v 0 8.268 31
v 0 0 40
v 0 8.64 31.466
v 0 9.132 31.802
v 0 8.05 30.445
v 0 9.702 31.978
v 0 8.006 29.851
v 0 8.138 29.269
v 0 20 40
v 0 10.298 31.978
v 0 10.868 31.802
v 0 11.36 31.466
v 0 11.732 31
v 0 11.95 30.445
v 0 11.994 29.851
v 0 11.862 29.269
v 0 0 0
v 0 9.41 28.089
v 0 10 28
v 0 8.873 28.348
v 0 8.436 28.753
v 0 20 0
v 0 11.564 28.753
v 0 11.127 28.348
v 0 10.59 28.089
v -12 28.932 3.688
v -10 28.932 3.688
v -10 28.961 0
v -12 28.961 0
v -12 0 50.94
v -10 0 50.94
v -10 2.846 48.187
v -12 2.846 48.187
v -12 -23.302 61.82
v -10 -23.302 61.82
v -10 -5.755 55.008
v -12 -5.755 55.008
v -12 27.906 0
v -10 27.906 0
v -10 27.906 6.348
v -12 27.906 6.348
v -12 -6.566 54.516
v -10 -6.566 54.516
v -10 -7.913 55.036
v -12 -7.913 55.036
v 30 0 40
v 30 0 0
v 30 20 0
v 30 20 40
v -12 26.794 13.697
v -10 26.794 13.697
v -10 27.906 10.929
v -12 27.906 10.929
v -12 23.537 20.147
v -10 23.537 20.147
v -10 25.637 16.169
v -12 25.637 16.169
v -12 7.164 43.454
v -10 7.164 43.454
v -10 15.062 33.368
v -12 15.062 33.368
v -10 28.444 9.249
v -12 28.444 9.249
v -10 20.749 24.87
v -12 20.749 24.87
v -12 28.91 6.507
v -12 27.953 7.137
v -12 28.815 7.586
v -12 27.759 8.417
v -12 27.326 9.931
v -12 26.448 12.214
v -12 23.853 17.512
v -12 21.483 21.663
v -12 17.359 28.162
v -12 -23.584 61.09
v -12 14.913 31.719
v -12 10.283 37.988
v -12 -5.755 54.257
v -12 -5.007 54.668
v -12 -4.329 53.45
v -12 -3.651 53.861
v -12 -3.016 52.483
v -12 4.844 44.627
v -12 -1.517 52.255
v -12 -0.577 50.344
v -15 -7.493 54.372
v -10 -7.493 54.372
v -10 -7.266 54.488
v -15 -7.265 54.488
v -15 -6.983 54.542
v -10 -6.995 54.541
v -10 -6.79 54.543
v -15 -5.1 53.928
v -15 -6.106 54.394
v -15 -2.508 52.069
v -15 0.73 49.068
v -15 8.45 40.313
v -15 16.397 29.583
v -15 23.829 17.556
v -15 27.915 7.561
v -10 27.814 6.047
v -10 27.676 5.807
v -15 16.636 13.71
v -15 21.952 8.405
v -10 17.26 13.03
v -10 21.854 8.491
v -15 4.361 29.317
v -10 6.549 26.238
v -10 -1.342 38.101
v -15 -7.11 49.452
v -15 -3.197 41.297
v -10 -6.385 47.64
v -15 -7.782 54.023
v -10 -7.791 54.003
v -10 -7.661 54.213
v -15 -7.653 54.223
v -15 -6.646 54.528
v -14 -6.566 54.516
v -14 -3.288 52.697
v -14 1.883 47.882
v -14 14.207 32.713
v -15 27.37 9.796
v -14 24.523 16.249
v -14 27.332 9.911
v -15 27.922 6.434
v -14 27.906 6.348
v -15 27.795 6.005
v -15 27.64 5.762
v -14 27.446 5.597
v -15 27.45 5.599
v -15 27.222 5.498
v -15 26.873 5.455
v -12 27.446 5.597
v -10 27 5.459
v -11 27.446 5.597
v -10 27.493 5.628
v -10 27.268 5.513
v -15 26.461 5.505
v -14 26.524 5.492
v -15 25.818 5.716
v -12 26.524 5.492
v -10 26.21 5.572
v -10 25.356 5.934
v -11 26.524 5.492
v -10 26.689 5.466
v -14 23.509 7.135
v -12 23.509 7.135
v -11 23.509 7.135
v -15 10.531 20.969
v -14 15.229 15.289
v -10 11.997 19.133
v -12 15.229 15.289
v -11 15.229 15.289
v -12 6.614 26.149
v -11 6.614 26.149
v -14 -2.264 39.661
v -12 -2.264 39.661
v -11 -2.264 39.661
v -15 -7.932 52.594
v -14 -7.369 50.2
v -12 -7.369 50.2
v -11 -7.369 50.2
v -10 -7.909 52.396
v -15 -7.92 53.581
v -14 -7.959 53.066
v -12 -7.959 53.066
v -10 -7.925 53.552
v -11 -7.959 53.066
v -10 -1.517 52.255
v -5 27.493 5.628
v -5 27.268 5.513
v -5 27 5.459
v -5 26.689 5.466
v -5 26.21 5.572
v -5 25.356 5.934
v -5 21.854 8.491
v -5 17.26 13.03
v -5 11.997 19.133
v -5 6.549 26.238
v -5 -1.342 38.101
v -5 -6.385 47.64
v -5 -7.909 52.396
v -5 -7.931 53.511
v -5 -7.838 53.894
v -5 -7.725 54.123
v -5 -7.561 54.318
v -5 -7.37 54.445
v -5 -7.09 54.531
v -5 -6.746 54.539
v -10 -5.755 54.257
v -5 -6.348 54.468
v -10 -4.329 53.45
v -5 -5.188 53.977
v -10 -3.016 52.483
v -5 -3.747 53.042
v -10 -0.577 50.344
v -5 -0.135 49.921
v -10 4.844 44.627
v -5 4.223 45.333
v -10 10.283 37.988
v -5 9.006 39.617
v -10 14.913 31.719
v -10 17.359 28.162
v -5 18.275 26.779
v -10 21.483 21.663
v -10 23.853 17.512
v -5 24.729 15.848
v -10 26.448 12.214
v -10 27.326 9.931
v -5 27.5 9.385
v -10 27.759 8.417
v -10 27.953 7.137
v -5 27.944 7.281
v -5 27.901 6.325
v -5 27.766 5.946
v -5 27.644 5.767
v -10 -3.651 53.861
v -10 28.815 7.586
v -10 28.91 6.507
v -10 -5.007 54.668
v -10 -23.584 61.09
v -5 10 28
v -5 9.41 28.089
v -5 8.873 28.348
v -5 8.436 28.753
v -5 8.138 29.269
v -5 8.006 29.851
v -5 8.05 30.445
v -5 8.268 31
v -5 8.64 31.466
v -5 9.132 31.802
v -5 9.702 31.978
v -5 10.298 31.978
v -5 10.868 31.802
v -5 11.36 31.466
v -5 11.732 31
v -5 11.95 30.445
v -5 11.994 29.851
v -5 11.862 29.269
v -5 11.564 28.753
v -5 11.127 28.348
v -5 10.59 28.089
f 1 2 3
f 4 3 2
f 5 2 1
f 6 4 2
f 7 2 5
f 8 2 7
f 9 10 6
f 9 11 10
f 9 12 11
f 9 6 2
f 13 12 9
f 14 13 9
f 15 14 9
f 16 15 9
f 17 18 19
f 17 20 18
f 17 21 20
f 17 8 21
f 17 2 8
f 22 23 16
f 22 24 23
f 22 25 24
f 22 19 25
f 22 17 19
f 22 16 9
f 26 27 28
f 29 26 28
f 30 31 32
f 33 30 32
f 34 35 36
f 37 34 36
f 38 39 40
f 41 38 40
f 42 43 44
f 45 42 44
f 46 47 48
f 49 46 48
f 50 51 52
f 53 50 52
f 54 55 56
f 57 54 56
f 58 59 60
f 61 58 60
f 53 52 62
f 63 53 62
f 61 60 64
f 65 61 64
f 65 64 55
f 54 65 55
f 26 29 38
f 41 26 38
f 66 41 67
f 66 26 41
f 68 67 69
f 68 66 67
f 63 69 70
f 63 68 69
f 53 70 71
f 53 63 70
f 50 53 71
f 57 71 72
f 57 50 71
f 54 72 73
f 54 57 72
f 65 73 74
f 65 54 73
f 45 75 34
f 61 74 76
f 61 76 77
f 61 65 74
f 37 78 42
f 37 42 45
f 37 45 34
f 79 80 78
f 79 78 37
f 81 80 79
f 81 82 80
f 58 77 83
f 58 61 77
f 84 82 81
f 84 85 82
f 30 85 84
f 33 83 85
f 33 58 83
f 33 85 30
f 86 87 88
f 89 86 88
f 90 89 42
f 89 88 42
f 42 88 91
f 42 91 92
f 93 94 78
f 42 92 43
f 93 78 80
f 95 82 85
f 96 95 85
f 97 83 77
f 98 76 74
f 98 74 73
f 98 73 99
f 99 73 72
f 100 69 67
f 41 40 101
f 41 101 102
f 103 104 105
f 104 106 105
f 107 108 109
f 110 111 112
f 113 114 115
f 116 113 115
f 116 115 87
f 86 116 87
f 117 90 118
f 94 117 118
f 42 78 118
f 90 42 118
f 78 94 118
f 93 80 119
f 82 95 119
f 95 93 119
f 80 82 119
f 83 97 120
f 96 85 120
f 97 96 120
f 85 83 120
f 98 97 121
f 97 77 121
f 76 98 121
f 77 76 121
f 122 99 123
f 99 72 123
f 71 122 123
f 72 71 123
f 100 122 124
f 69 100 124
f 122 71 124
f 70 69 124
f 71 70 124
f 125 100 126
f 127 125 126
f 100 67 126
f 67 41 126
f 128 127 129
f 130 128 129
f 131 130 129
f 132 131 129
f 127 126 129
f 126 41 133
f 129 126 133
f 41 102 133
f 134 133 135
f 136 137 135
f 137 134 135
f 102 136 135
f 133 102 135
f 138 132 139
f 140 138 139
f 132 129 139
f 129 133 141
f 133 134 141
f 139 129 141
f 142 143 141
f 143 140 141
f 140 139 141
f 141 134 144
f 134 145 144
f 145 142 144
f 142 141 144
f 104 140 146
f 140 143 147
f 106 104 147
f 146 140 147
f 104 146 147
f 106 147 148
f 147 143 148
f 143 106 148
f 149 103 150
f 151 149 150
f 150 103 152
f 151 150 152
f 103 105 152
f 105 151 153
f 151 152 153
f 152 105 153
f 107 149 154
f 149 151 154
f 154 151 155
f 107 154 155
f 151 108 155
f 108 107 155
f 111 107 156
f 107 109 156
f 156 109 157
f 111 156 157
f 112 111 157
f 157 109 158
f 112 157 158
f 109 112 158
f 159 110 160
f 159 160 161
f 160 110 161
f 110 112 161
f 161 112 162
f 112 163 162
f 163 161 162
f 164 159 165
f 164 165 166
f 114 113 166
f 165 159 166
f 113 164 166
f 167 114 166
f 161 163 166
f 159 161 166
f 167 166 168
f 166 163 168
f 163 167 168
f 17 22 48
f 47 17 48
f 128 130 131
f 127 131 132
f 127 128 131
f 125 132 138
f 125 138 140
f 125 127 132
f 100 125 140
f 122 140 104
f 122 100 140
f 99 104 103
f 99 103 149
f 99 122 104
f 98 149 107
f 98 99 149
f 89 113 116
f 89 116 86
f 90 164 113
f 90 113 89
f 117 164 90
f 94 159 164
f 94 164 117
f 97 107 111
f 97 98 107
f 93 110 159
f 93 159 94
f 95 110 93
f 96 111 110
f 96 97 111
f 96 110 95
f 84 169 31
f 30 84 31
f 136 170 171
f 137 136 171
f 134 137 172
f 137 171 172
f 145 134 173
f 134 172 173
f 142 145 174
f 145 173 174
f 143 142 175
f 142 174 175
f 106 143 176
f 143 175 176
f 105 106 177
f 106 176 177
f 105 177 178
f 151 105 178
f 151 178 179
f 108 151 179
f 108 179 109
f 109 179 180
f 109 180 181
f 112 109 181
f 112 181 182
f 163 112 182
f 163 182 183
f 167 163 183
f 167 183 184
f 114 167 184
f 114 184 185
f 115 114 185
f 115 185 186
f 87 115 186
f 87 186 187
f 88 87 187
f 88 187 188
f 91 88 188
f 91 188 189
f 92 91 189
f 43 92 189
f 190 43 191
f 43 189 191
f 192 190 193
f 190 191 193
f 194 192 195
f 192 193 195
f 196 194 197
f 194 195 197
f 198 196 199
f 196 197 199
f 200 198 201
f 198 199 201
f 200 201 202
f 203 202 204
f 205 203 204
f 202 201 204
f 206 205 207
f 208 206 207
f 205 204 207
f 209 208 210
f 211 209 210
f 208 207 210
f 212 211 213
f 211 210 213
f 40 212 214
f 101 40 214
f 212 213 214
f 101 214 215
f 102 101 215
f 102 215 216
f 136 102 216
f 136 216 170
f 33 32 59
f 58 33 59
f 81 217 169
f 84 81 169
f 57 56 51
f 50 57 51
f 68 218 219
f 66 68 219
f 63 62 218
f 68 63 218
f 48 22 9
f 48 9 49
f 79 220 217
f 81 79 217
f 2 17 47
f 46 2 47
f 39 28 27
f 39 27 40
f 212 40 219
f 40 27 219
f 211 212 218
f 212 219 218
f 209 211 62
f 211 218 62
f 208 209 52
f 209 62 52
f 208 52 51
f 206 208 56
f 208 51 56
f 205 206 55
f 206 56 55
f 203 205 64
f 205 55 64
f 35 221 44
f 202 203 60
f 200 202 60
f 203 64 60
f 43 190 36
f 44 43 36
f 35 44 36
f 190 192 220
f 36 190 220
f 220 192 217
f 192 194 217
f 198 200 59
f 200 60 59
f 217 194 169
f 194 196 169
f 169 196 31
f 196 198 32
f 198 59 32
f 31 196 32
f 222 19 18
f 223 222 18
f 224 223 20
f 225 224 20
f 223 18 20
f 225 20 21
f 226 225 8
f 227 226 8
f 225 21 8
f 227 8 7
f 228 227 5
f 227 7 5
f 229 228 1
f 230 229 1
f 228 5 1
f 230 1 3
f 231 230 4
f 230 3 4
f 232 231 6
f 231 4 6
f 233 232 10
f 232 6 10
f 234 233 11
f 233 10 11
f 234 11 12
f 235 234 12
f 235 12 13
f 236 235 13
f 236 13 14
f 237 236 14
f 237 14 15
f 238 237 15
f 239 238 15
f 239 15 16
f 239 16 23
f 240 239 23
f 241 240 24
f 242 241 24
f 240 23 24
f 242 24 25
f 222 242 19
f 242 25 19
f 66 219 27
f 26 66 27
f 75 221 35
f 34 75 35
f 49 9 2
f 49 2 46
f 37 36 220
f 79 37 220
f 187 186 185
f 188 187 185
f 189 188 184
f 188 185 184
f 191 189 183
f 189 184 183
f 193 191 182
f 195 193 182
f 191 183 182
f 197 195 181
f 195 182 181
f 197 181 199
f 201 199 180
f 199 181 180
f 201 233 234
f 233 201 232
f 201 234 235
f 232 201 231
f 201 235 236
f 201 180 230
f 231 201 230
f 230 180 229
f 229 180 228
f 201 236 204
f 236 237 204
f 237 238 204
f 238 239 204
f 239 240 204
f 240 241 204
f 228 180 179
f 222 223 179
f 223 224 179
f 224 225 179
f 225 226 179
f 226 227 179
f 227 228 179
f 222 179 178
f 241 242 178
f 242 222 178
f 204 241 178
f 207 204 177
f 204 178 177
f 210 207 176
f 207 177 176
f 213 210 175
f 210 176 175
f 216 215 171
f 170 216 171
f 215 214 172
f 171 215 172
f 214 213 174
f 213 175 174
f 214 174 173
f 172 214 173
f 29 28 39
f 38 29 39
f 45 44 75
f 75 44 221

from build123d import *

# Parameters (mm, degrees)
SKETCH_1_W      = 30
SKETCH_1_H      = 20
EXTRUDE_1_DEPTH = 40
SKETCH_2_R      = 2
EXTRUDE_2_DEPTH = 5
SKETCH_3_RX     = 30
SKETCH_3_RY     = 5
EXTRUDE_3_DEPTH = 5
EXTRUDE_4_DEPTH = 2
EXTRUDE_5_DEPTH = 5


# Read off the part's stored shape, not the designer's step: 凸台-拉伸5
with BuildPart() as part:
    # 草图1 → 凸台-拉伸1 (new body)
    with BuildSketch(Plane.XY):
        with Locations((15, 10)):
            Rectangle(SKETCH_1_W, SKETCH_1_H)
    extrude(amount=EXTRUDE_1_DEPTH)

    # 草图2 → 凸台-拉伸2 (add)
    with BuildSketch(Plane.ZY):
        with Locations(Location((30, 10, 0), (0, 0, 180))):
            Circle(SKETCH_2_R)
    extrude(amount=EXTRUDE_2_DEPTH)

    # 草图3 → 凸台-拉伸3 (add)
    with BuildSketch(Plane.ZY.offset(5)):
        with Locations(Location((30, 10), (0, 0, 144.330167024))):
            Ellipse(SKETCH_3_RX, SKETCH_3_RY)
    extrude(amount=EXTRUDE_3_DEPTH)



with BuildPart() as body_2:
    # 草图4 → 凸台-拉伸4 (new body)
    with BuildSketch(Plane.ZY.offset(10)):
        with BuildLine():
            add(Edge.make_bspline(
                [(6.506952715, 28.909855834), (5.513332822, 28.917697958), (4.992779523, 28.561751889)],
                knots=[6.015569415, 6.015569415, 6.015569415, 6.212983263, 6.212983263, 6.212983263], degree=2, weights=[1, 0.995132426, 1]))
            Line((4.992779523, 28.561751889), (7.137480457, 27.953085866))
            add(Edge.make_bspline(
                [(8.41739908, 27.759268462), (7.691843708, 27.924954947), (7.137480457, 27.953085866)],
                knots=[5.905821209, 5.905821209, 5.905821209, 6.029787374, 6.029787374, 6.029787374], degree=2, weights=[1, 0.998079664, 1]))
            add(Edge.make_bspline(
                [(9.931154304, 27.32571063), (9.102712315, 27.602771598), (8.41739908, 27.759268462)],
                knots=[5.788714528, 5.788714528, 5.788714528, 5.905821209, 5.905821209, 5.905821209], degree=2, weights=[1, 0.998286243, 1]))
            add(Edge.make_bspline(
                [(12.213928034, 26.448131332), (10.970222869, 26.978208516), (9.931154304, 27.32571063)],
                knots=[5.641930178, 5.641930178, 5.641930178, 5.788714528, 5.788714528, 5.788714528], degree=2, weights=[1, 0.997308003, 1]))
            add(Edge.make_bspline(
                [(17.511716763, 23.85284507), (14.569327703, 25.444240976), (12.213928034, 26.448131332)],
                knots=[5.365220638, 5.365220638, 5.365220638, 5.641930178, 5.641930178, 5.641930178], degree=2, weights=[1, 0.990444236, 1]))
            add(Edge.make_bspline(
                [(21.663153618, 21.483483589), (19.49565109, 22.779830964), (17.511716763, 23.85284507)],
                knots=[5.17799572, 5.17799572, 5.17799572, 5.365220638, 5.365220638, 5.365220638], degree=2, weights=[1, 0.995621553, 1]))
            add(Edge.make_bspline(
                [(28.161833123, 17.358582765), (24.817516303, 19.596911494), (21.663153618, 21.483483589)],
                knots=[4.906410628, 4.906410628, 4.906410628, 5.17799572, 5.17799572, 5.17799572], degree=2, weights=[1, 0.990794351, 1]))
            add(Edge.make_bspline(
                [(31.719121271, 14.913354973), (29.940162996, 16.168358555), (28.161833123, 17.358582765)],
                knots=[4.761356742, 4.761356742, 4.761356742, 4.906410628, 4.906410628, 4.906410628], degree=2, weights=[1, 0.997371074, 1]))
            add(Edge.make_bspline(
                [(37.988291289, 10.282541681), (34.937566868, 12.642834742), (31.719121271, 14.913354973)],
                knots=[4.4999664, 4.4999664, 4.4999664, 4.761356742, 4.761356742, 4.761356742], degree=2, weights=[1, 0.991471536, 1]))
            add(Edge.make_bspline(
                [(44.627089911, 4.844191407), (41.578227004, 7.505070109), (37.988291289, 10.282541681)],
                knots=[4.193044565, 4.193044565, 4.193044565, 4.4999664, 4.4999664, 4.4999664], degree=2, weights=[1, 0.988247964, 1]))
            add(Edge.make_bspline(
                [(50.343902664, -0.577200355), (47.99639472, 1.903648758), (44.627089911, 4.844191407)],
                knots=[3.854449116, 3.854449116, 3.854449116, 4.193044565, 4.193044565, 4.193044565], degree=2, weights=[1, 0.985703337, 1]))
            add(Edge.make_bspline(
                [(52.4832091, -3.016334631), (51.589789327, -1.893854823), (50.343902664, -0.577200355)],
                knots=[3.673505786, 3.673505786, 3.673505786, 3.854449116, 3.854449116, 3.854449116], degree=2, weights=[1, 0.99591023, 1]))
            add(Edge.make_bspline(
                [(53.450493398, -4.328804293), (53.040359197, -3.716330033), (52.4832091, -3.016334631)],
                knots=[3.56047839, 3.56047839, 3.56047839, 3.673505786, 3.673505786, 3.673505786], degree=2, weights=[1, 0.998403526, 1]))
            add(Edge.make_bspline(
                [(54.25730413, -5.755095942), (53.982230556, -5.122874432), (53.450493398, -4.328804293)],
                knots=[3.414044896, 3.414044896, 3.414044896, 3.56047839, 3.56047839, 3.56047839], degree=2, weights=[1, 0.997320851, 1]))
            add(Edge.make_bspline(
                [(54.515784231, -6.566048985), (54.452837221, -6.2045038), (54.25730413, -5.755095942)],
                knots=[3.309862159, 3.309862159, 3.309862159, 3.414044896, 3.414044896, 3.414044896], degree=2, weights=[1, 0.998643551, 1]))
            Line((54.515784231, -6.566048985), (55.035975621, -7.912515095))
            add(Edge.make_bspline(
                [(55.035975621, -7.912515095), (55.571319453, -7.205458838), (55.0082883, -5.755095942)],
                knots=[3.136655758, 3.136655758, 3.136655758, 3.430060288, 3.430060288, 3.430060288], degree=2, weights=[1, 0.989258508, 1]))
            Line((55.0082883, -5.755095942), (54.668462814, -5.006548181))
            Line((54.668462814, -5.006548181), (53.860777814, -3.651060405))
            Line((53.860777814, -3.651060405), (52.255398503, -1.516776462))
            Line((52.255398503, -1.516776462), (50.940415781, 0))
            Line((50.940415781, 0), (48.186919212, 2.84562684))
            Line((48.186919212, 2.84562684), (43.454466091, 7.163503062))
            Line((43.454466091, 7.163503062), (33.368126059, 15.062192859))
            Line((33.368126059, 15.062192859), (24.869605616, 20.749286032))
            Line((24.869605616, 20.749286032), (20.147321799, 23.537005238))
            Line((20.147321799, 23.537005238), (16.169043828, 25.636582623))
            Line((16.169043828, 25.636582623), (13.69703985, 26.794407183))
            Line((13.69703985, 26.794407183), (10.928759246, 27.90628218))
            Line((10.928759246, 27.90628218), (9.248929013, 28.444330815))
            Line((9.248929013, 28.444330815), (7.585869147, 28.814585944))
            Line((7.585869147, 28.814585944), (6.506952715, 28.909855834))
        make_face()
        with BuildLine():
            Line((3.687796669, 28.932105961), (4.992779523, 28.561751889))
            add(Edge.make_bspline(
                [(6.506952715, 28.909855834), (5.513332822, 28.917697958), (4.992779523, 28.561751889)],
                knots=[6.015569415, 6.015569415, 6.015569415, 6.212983263, 6.212983263, 6.212983263], degree=2, weights=[1, 0.995132426, 1]))
            Line((6.506952715, 28.909855834), (3.687796669, 28.932105961))
        make_face()
        with BuildLine():
            Line((0, 28.264369192), (4.685334353, 28.264369192))
            add(Edge.make_bspline(
                [(4.992779523, 28.561751889), (4.808192105, 28.435533949), (4.685334353, 28.264369192)],
                knots=[6.212983263, 6.212983263, 6.212983263, 6.283185307, 6.283185307, 6.283185307], degree=2, weights=[1, 0.999384022, 1]))
            Line((4.992779523, 28.561751889), (3.687796669, 28.932105961))
            Line((3.687796669, 28.932105961), (0, 28.961211815))
            Line((0, 28.961211815), (0, 28.264369192))
        make_face()
        with BuildLine():
            add(Edge.make_bspline(
                [(4.685334353, 28.264369192), (4.57062955, 28.10456308), (4.510252037, 27.90628218)],
                knots=[0, 0, 0, 0.065546828, 0.065546828, 0.065546828], degree=2, weights=[1, 0.999463, 1]))
            Line((4.685334353, 28.264369192), (0, 28.264369192))
            Line((0, 28.264369192), (0, 27.90628218))
            Line((0, 27.90628218), (4.510252037, 27.90628218))
        make_face()
        with BuildLine():
            add(Edge.make_bspline(
                [(4.992779523, 28.561751889), (4.808192105, 28.435533949), (4.685334353, 28.264369192)],
                knots=[6.212983263, 6.212983263, 6.212983263, 6.283185307, 6.283185307, 6.283185307], degree=2, weights=[1, 0.999384022, 1]))
            add(Edge.make_bspline(
                [(4.685334353, 28.264369192), (4.57062955, 28.10456308), (4.510252037, 27.90628218)],
                knots=[0, 0, 0, 0.065546828, 0.065546828, 0.065546828], degree=2, weights=[1, 0.999463, 1]))
            Line((4.510252037, 27.90628218), (6.34848035, 27.90628218))
            add(Edge.make_bspline(
                [(7.137480457, 27.953085866), (6.682690118, 27.976164001), (6.34848035, 27.90628218)],
                knots=[6.029787374, 6.029787374, 6.029787374, 6.131529727, 6.131529727, 6.131529727], degree=2, weights=[1, 0.998706341, 1]))
            Line((7.137480457, 27.953085866), (4.992779523, 28.561751889))
        make_face()
        with BuildLine():
            add(Edge.make_bspline(
                [(55.035975621, -7.912515095), (55.571319453, -7.205458838), (55.0082883, -5.755095942)],
                knots=[3.136655758, 3.136655758, 3.136655758, 3.430060288, 3.430060288, 3.430060288], degree=2, weights=[1, 0.989258508, 1]))
            Line((55.035975621, -7.912515095), (61.090316434, -23.583602479))
            Line((61.090316434, -23.583602479), (61.819897807, -23.301737273))
            Line((61.819897807, -23.301737273), (55.0082883, -5.755095942))
        make_face()
    extrude(amount=EXTRUDE_4_DEPTH)


with BuildPart() as part_1:
    add(part.part)

    add(body_2.part)  # 凸台-拉伸5 merges body 2
    # 凸台-拉伸5 outline → 凸台-拉伸5 (add)
    with BuildSketch(Plane.ZY.offset(10)):
        with BuildLine():
            add(Edge.make_bspline(
                [(54.371719706, -7.493406717), (54.465505659, -7.362744634), (54.529944837, -7.206425025), (54.561913477, -7.022620585), (54.558192199, -6.809625231), (54.202681657, -4.767699434), (51.727605158, -1.240686466), (46.200440793, 4.025468627), (39.039651813, 9.679286683), (26.386377317, 18.734970385), (18.758776419, 23.664893419), (12.075170793, 27.137730816), (8.050806871, 28.262231314), (4.642942369, 27.549661544), (4.877580773, 25.652182817), (7.730736464, 22.205445776), (11.438087078, 18.596318521), (22.095709136, 9.277375664), (34.757298876, -0.521475217), (47.784810652, -8.095593664), (53.361737398, -8.90050861), (54.371719706, -7.493406717)],
                knots=[0, 0, 0, 0, 0, 0, 0.194483448, 0.194483448, 0.194483448, 0.194483448, 1.630375604, 1.630375604, 1.630375604, 1.630375604, 3.066267761, 3.066267761, 3.066267761, 3.066267761, 4.504868745, 4.504868745, 4.504868745, 4.504868745, 7.04748776, 7.04748776, 7.04748776, 7.04748776, 7.04748776, 7.04748776], degree=5, weights=[1, 1, 1.000007219, 1.000006403, 1, 1, 0.977216815, 0.977216815, 1, 1, 0.977216815, 0.977216815, 1, 1, 0.990702131, 0.997630061, 1, 1, 0.9, 0.9, 1, 1]))
        make_face()
    extrude(amount=EXTRUDE_5_DEPTH)


solid = part_1.part
